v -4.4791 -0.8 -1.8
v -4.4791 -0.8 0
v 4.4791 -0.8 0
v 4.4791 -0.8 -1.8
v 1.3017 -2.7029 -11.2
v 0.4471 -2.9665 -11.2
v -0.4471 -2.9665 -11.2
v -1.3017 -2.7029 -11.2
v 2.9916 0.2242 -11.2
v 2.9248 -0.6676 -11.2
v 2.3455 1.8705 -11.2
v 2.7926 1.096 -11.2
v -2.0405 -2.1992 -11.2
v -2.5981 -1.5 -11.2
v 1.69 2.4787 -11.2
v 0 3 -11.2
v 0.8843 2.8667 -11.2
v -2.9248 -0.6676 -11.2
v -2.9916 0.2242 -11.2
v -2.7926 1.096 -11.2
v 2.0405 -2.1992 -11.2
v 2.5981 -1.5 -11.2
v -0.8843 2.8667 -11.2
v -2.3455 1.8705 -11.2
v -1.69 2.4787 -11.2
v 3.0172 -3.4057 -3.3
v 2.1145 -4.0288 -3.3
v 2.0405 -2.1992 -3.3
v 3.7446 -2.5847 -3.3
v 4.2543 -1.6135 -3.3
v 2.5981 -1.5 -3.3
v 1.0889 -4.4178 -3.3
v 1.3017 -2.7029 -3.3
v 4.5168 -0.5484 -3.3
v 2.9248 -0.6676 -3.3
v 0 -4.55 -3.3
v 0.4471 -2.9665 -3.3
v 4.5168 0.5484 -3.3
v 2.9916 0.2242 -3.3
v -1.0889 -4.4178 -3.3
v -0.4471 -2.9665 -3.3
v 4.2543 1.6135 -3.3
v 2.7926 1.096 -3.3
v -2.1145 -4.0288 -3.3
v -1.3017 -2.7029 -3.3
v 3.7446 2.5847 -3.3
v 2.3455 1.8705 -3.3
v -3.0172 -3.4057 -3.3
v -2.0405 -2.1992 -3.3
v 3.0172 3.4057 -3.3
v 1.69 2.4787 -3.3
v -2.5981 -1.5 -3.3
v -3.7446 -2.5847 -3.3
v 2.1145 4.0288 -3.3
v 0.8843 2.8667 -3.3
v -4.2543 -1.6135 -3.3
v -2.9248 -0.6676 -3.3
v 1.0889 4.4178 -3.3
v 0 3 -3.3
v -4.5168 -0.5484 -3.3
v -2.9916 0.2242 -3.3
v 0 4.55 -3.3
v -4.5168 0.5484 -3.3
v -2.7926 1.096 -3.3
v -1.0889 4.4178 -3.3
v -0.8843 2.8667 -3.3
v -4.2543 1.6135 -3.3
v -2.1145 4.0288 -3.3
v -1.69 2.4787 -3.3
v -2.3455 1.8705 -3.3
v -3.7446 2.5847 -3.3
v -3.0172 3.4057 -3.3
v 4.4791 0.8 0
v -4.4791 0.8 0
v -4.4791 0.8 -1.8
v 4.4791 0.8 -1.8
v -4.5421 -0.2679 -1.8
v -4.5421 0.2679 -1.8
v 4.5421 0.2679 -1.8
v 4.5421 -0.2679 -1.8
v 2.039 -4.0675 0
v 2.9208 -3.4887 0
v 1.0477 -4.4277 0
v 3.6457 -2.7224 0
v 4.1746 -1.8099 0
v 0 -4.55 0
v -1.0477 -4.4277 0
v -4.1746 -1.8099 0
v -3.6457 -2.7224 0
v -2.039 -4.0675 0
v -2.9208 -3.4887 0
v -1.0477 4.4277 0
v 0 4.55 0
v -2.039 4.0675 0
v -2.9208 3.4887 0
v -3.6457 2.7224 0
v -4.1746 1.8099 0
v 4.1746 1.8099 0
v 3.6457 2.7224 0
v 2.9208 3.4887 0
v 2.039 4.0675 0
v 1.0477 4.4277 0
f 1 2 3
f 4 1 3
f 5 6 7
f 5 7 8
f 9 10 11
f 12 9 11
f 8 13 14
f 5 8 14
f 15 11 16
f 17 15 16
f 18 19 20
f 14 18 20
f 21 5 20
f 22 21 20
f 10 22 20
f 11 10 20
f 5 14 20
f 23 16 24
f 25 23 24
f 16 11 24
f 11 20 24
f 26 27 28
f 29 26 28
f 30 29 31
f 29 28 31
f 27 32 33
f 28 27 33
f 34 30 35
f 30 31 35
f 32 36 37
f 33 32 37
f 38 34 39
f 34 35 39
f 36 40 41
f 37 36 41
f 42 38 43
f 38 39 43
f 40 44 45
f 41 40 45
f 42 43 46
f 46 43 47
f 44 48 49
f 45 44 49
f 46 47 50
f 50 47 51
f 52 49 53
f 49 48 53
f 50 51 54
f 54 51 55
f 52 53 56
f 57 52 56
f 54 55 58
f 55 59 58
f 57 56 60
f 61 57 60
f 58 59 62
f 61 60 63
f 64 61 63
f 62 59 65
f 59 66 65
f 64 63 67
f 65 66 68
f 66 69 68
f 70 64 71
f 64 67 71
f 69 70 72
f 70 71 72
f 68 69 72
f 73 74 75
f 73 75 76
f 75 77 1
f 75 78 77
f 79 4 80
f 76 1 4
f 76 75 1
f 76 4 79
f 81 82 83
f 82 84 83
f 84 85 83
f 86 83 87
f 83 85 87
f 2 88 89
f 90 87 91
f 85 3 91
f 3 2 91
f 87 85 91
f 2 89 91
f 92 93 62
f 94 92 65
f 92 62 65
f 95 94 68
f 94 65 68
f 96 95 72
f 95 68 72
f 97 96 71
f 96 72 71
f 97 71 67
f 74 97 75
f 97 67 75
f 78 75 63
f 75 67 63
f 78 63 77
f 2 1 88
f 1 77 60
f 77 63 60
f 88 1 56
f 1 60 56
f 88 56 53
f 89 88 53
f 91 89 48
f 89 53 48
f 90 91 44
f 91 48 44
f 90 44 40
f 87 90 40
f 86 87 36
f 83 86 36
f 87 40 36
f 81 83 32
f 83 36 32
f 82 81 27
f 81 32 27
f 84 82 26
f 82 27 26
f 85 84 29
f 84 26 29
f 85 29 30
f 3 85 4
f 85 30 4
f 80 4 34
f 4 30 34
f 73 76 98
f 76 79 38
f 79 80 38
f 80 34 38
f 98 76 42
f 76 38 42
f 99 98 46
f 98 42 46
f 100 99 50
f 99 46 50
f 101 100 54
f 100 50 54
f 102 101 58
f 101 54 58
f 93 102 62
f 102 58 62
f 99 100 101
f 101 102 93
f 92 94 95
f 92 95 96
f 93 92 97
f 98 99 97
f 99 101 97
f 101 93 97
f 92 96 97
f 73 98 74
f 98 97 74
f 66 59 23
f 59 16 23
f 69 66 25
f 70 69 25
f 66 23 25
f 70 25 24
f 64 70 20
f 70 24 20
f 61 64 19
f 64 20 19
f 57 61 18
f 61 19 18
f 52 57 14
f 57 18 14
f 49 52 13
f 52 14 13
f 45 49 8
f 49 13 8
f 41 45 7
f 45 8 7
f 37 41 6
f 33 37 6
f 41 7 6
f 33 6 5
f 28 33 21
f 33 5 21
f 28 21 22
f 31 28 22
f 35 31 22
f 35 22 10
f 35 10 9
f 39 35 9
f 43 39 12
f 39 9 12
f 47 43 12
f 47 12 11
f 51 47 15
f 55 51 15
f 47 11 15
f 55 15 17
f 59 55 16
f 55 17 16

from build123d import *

# Parameters (mm, degrees)
SKETCH_2_W          = 11.343097154
SKETCH_2_H          = 1.6
CUT_EXTRUDE_1_DEPTH = 1.8


with BuildPart() as part:
    # 스케치1 → 회전1 (revolve)
    with BuildSketch(Plane(origin=(0, 0, 0), x_dir=(0, 0, -1), z_dir=(1, 0, 0))):
        Polygon((0, 0), (0, 4.55), (3.3, 4.55), (3.3, 3), (11.2, 3), (11.2, 0), align=None)
    revolve(axis=Axis((0, 0, -11.2), (0, 0, 1)))

    # 스케치2 → 컷-돌출1 (cut)
    with BuildSketch(Plane.XY):
        with Locations((-0.136663821, 0)):
            Rectangle(SKETCH_2_W, SKETCH_2_H)
    extrude(amount=-CUT_EXTRUDE_1_DEPTH, mode=Mode.SUBTRACT)


solid = part.part
